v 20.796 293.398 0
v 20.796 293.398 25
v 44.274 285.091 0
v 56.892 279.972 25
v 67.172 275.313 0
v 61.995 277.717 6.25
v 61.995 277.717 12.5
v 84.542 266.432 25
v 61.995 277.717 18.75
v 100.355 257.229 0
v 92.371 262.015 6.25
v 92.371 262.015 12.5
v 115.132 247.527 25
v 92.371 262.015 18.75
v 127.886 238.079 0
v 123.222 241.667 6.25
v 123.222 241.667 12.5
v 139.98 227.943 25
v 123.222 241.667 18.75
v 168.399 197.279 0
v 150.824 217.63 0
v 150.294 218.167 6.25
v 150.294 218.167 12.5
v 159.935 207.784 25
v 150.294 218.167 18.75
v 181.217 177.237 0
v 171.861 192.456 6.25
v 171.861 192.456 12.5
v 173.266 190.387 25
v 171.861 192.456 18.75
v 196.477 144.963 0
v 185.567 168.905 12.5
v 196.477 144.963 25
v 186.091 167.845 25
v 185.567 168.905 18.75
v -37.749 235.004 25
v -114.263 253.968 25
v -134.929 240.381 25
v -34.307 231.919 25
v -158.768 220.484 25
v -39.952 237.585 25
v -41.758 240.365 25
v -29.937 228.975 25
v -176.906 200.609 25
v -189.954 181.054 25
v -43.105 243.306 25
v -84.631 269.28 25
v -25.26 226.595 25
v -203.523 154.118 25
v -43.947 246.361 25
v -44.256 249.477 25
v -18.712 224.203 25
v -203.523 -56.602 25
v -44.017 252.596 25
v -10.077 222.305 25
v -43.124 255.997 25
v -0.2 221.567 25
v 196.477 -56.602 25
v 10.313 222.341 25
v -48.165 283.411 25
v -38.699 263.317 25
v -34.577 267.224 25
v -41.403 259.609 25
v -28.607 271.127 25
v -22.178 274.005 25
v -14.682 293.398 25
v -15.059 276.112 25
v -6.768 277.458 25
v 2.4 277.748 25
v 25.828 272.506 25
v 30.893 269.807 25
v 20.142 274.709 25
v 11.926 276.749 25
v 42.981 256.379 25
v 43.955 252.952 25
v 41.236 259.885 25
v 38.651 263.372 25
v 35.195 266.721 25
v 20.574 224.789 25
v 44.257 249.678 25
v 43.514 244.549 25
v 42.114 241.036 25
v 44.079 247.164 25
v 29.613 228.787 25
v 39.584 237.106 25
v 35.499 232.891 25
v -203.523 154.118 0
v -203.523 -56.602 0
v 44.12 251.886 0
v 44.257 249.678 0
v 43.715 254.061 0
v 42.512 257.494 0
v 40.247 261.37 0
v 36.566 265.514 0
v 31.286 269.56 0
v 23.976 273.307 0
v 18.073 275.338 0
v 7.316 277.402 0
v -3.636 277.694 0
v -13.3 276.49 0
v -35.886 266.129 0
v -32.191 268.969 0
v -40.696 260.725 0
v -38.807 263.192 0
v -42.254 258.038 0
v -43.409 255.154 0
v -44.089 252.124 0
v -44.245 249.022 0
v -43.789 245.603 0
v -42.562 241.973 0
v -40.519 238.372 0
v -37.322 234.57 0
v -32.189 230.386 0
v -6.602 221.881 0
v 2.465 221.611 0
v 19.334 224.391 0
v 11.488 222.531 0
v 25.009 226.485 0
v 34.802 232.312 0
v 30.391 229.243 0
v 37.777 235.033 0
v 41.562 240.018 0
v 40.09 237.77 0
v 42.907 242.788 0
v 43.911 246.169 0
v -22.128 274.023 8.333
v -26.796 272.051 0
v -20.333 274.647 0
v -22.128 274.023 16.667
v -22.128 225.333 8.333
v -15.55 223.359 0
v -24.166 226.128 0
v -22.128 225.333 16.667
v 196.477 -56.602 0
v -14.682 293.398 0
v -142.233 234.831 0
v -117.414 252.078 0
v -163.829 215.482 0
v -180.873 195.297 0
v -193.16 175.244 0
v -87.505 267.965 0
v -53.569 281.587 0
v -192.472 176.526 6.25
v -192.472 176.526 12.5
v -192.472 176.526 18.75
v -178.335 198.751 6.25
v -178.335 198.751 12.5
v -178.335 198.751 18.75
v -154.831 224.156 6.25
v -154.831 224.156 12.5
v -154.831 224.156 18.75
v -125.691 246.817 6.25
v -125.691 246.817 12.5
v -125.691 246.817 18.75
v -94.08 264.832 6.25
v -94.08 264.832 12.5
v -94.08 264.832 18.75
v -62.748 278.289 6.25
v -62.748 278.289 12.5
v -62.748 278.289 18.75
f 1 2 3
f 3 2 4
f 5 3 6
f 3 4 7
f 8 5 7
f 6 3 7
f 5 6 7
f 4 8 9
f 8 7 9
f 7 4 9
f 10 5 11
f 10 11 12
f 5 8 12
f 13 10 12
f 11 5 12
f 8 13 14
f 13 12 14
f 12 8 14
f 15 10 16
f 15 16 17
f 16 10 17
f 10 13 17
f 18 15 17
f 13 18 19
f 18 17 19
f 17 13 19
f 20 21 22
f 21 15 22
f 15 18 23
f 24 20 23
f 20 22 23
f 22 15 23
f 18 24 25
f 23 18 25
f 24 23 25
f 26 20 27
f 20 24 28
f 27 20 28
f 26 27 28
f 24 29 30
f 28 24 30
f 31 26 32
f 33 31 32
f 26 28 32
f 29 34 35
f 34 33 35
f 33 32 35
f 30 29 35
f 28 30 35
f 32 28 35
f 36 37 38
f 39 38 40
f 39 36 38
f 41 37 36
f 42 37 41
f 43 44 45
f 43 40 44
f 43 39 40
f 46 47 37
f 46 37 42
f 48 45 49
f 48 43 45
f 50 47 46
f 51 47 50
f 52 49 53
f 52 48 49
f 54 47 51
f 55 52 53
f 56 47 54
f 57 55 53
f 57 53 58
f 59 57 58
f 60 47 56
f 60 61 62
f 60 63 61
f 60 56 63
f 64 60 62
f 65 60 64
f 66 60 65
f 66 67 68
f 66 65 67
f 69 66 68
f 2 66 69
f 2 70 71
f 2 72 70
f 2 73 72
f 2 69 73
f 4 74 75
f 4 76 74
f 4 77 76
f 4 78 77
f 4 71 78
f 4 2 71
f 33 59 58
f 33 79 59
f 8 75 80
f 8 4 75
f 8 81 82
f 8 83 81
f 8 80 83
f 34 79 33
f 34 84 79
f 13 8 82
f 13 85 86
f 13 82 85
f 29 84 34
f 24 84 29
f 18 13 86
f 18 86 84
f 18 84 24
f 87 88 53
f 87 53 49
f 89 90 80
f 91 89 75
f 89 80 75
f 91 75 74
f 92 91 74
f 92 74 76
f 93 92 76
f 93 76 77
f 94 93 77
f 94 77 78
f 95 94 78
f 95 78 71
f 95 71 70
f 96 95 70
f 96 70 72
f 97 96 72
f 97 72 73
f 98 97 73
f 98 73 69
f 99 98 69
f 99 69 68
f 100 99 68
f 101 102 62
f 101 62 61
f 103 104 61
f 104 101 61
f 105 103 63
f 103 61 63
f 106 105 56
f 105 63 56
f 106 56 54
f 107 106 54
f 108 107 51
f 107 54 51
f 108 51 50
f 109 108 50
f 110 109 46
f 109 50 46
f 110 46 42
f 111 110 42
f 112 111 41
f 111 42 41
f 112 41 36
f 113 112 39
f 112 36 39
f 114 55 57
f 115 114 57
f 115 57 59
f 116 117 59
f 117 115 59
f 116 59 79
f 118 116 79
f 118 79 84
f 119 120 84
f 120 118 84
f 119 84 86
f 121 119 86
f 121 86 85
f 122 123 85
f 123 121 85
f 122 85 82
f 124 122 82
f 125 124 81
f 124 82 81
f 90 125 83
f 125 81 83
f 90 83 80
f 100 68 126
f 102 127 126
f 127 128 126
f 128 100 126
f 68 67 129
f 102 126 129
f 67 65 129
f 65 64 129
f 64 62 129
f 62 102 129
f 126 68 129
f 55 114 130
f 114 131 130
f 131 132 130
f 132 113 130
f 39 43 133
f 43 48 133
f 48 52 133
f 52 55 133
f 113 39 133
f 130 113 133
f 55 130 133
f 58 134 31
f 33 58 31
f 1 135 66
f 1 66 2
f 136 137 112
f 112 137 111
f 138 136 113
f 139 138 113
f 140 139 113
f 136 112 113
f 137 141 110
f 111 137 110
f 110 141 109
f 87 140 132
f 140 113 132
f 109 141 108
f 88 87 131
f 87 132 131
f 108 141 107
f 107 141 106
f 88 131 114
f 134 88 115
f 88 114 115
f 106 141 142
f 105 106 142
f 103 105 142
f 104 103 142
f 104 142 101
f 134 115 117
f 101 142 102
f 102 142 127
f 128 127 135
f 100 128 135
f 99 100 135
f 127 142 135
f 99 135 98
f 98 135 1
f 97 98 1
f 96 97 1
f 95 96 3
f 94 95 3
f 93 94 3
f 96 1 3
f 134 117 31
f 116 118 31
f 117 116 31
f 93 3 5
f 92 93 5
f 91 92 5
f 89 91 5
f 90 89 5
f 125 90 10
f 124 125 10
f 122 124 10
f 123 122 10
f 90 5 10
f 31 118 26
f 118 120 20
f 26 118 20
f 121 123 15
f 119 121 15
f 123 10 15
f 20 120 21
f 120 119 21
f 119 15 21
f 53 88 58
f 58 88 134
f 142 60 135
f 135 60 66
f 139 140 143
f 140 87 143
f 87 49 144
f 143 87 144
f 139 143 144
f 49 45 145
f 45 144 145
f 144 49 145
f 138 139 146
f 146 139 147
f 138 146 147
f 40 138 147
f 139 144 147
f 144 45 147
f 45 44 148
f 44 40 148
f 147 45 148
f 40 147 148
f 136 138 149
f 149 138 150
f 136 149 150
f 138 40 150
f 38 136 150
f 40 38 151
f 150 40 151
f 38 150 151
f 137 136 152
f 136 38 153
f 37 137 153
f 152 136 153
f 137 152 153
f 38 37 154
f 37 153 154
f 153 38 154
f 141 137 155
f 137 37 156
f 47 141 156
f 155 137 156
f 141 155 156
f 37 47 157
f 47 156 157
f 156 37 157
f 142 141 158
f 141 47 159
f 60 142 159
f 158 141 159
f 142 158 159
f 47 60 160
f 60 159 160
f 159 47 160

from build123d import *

# Parameters (mm, degrees)
F0_W     = 400
F0_H     = 350
F1_DEPTH = 25
F3_DEPTH = 25.001
F4_DEPTH = 25.0010001


with BuildPart() as f1:
    # F0 (on Top) → F1 (new body)
    with BuildSketch(Plane.XY):
        with Locations((-3.5233765841, 118.3980174363)):
            Rectangle(F0_W, F0_H)
    extrude(amount=F1_DEPTH)

    # F2 (on face) → F3 (cut, through all)
    with BuildSketch(Plane.XY.offset(25)):
        with BuildLine():
            add(Edge.make_bspline(
                [(44.2566461861, 249.6780008078), (44.2566461861, 298.3677757365), (-22.1283230931, 274.0228882721), (-88.5132923722, 249.6780008078), (-22.1283230931, 225.3331133434), (44.2566461861, 200.988225879), (44.2566461861, 249.6780008078)],
                knots=[0, 0, 0, 2.0943951024, 2.0943951024, 4.1887902048, 4.1887902048, 6.2831853072, 6.2831853072, 6.2831853072], degree=2, weights=[1, 0.5, 1, 0.5, 1, 0.5, 1]))
        make_face()
        with BuildLine():
            Line((-203.5233765841, 293.3980174363), (-203.5233765841, 154.1179567575))
            add(Edge.make_bspline(
                [(-203.5233765841, 154.1179567575), (-196.4985438324, 169.0769109558), (-181.1886958169, 201.6783013863), (-127.6033977729, 250.0265307191), (-64.03503585, 279.499396574), (-30.1926324088, 289.0298899369), (-14.6815851331, 293.3980174363)],
                knots=[0, 0, 0, 0, 0.2302698792, 0.5018477988, 0.7716810404, 1, 1, 1, 1], degree=3))
            Line((-14.6815851331, 293.3980174363), (-203.5233765841, 293.3980174363))
        make_face()
    extrude(amount=-F3_DEPTH, mode=Mode.SUBTRACT)

    # F2 (on face) → F4 (cut, through all)
    with BuildSketch(Plane.XY.offset(25)):
        with BuildLine():
            Line((196.4766234159, 293.3980174363), (20.7957923412, 293.3980174363))
            add(Edge.make_bspline(
                [(20.7957923412, 293.3980174363), (33.8633883832, 288.9695333507), (63.5210100201, 278.9188472863), (125.5125321267, 244.1660098466), (174.6334198472, 195.1743773184), (189.5141817422, 160.9673562984), (196.4766234159, 144.9625045061)],
                knots=[0, 0, 0, 0, 0.216264973, 0.4908251467, 0.7617662158, 1, 1, 1, 1], degree=3))
            Line((196.4766234159, 144.9625045061), (196.4766234159, 293.3980174363))
        make_face()
    extrude(amount=-F4_DEPTH, mode=Mode.SUBTRACT)


solid = f1.part
